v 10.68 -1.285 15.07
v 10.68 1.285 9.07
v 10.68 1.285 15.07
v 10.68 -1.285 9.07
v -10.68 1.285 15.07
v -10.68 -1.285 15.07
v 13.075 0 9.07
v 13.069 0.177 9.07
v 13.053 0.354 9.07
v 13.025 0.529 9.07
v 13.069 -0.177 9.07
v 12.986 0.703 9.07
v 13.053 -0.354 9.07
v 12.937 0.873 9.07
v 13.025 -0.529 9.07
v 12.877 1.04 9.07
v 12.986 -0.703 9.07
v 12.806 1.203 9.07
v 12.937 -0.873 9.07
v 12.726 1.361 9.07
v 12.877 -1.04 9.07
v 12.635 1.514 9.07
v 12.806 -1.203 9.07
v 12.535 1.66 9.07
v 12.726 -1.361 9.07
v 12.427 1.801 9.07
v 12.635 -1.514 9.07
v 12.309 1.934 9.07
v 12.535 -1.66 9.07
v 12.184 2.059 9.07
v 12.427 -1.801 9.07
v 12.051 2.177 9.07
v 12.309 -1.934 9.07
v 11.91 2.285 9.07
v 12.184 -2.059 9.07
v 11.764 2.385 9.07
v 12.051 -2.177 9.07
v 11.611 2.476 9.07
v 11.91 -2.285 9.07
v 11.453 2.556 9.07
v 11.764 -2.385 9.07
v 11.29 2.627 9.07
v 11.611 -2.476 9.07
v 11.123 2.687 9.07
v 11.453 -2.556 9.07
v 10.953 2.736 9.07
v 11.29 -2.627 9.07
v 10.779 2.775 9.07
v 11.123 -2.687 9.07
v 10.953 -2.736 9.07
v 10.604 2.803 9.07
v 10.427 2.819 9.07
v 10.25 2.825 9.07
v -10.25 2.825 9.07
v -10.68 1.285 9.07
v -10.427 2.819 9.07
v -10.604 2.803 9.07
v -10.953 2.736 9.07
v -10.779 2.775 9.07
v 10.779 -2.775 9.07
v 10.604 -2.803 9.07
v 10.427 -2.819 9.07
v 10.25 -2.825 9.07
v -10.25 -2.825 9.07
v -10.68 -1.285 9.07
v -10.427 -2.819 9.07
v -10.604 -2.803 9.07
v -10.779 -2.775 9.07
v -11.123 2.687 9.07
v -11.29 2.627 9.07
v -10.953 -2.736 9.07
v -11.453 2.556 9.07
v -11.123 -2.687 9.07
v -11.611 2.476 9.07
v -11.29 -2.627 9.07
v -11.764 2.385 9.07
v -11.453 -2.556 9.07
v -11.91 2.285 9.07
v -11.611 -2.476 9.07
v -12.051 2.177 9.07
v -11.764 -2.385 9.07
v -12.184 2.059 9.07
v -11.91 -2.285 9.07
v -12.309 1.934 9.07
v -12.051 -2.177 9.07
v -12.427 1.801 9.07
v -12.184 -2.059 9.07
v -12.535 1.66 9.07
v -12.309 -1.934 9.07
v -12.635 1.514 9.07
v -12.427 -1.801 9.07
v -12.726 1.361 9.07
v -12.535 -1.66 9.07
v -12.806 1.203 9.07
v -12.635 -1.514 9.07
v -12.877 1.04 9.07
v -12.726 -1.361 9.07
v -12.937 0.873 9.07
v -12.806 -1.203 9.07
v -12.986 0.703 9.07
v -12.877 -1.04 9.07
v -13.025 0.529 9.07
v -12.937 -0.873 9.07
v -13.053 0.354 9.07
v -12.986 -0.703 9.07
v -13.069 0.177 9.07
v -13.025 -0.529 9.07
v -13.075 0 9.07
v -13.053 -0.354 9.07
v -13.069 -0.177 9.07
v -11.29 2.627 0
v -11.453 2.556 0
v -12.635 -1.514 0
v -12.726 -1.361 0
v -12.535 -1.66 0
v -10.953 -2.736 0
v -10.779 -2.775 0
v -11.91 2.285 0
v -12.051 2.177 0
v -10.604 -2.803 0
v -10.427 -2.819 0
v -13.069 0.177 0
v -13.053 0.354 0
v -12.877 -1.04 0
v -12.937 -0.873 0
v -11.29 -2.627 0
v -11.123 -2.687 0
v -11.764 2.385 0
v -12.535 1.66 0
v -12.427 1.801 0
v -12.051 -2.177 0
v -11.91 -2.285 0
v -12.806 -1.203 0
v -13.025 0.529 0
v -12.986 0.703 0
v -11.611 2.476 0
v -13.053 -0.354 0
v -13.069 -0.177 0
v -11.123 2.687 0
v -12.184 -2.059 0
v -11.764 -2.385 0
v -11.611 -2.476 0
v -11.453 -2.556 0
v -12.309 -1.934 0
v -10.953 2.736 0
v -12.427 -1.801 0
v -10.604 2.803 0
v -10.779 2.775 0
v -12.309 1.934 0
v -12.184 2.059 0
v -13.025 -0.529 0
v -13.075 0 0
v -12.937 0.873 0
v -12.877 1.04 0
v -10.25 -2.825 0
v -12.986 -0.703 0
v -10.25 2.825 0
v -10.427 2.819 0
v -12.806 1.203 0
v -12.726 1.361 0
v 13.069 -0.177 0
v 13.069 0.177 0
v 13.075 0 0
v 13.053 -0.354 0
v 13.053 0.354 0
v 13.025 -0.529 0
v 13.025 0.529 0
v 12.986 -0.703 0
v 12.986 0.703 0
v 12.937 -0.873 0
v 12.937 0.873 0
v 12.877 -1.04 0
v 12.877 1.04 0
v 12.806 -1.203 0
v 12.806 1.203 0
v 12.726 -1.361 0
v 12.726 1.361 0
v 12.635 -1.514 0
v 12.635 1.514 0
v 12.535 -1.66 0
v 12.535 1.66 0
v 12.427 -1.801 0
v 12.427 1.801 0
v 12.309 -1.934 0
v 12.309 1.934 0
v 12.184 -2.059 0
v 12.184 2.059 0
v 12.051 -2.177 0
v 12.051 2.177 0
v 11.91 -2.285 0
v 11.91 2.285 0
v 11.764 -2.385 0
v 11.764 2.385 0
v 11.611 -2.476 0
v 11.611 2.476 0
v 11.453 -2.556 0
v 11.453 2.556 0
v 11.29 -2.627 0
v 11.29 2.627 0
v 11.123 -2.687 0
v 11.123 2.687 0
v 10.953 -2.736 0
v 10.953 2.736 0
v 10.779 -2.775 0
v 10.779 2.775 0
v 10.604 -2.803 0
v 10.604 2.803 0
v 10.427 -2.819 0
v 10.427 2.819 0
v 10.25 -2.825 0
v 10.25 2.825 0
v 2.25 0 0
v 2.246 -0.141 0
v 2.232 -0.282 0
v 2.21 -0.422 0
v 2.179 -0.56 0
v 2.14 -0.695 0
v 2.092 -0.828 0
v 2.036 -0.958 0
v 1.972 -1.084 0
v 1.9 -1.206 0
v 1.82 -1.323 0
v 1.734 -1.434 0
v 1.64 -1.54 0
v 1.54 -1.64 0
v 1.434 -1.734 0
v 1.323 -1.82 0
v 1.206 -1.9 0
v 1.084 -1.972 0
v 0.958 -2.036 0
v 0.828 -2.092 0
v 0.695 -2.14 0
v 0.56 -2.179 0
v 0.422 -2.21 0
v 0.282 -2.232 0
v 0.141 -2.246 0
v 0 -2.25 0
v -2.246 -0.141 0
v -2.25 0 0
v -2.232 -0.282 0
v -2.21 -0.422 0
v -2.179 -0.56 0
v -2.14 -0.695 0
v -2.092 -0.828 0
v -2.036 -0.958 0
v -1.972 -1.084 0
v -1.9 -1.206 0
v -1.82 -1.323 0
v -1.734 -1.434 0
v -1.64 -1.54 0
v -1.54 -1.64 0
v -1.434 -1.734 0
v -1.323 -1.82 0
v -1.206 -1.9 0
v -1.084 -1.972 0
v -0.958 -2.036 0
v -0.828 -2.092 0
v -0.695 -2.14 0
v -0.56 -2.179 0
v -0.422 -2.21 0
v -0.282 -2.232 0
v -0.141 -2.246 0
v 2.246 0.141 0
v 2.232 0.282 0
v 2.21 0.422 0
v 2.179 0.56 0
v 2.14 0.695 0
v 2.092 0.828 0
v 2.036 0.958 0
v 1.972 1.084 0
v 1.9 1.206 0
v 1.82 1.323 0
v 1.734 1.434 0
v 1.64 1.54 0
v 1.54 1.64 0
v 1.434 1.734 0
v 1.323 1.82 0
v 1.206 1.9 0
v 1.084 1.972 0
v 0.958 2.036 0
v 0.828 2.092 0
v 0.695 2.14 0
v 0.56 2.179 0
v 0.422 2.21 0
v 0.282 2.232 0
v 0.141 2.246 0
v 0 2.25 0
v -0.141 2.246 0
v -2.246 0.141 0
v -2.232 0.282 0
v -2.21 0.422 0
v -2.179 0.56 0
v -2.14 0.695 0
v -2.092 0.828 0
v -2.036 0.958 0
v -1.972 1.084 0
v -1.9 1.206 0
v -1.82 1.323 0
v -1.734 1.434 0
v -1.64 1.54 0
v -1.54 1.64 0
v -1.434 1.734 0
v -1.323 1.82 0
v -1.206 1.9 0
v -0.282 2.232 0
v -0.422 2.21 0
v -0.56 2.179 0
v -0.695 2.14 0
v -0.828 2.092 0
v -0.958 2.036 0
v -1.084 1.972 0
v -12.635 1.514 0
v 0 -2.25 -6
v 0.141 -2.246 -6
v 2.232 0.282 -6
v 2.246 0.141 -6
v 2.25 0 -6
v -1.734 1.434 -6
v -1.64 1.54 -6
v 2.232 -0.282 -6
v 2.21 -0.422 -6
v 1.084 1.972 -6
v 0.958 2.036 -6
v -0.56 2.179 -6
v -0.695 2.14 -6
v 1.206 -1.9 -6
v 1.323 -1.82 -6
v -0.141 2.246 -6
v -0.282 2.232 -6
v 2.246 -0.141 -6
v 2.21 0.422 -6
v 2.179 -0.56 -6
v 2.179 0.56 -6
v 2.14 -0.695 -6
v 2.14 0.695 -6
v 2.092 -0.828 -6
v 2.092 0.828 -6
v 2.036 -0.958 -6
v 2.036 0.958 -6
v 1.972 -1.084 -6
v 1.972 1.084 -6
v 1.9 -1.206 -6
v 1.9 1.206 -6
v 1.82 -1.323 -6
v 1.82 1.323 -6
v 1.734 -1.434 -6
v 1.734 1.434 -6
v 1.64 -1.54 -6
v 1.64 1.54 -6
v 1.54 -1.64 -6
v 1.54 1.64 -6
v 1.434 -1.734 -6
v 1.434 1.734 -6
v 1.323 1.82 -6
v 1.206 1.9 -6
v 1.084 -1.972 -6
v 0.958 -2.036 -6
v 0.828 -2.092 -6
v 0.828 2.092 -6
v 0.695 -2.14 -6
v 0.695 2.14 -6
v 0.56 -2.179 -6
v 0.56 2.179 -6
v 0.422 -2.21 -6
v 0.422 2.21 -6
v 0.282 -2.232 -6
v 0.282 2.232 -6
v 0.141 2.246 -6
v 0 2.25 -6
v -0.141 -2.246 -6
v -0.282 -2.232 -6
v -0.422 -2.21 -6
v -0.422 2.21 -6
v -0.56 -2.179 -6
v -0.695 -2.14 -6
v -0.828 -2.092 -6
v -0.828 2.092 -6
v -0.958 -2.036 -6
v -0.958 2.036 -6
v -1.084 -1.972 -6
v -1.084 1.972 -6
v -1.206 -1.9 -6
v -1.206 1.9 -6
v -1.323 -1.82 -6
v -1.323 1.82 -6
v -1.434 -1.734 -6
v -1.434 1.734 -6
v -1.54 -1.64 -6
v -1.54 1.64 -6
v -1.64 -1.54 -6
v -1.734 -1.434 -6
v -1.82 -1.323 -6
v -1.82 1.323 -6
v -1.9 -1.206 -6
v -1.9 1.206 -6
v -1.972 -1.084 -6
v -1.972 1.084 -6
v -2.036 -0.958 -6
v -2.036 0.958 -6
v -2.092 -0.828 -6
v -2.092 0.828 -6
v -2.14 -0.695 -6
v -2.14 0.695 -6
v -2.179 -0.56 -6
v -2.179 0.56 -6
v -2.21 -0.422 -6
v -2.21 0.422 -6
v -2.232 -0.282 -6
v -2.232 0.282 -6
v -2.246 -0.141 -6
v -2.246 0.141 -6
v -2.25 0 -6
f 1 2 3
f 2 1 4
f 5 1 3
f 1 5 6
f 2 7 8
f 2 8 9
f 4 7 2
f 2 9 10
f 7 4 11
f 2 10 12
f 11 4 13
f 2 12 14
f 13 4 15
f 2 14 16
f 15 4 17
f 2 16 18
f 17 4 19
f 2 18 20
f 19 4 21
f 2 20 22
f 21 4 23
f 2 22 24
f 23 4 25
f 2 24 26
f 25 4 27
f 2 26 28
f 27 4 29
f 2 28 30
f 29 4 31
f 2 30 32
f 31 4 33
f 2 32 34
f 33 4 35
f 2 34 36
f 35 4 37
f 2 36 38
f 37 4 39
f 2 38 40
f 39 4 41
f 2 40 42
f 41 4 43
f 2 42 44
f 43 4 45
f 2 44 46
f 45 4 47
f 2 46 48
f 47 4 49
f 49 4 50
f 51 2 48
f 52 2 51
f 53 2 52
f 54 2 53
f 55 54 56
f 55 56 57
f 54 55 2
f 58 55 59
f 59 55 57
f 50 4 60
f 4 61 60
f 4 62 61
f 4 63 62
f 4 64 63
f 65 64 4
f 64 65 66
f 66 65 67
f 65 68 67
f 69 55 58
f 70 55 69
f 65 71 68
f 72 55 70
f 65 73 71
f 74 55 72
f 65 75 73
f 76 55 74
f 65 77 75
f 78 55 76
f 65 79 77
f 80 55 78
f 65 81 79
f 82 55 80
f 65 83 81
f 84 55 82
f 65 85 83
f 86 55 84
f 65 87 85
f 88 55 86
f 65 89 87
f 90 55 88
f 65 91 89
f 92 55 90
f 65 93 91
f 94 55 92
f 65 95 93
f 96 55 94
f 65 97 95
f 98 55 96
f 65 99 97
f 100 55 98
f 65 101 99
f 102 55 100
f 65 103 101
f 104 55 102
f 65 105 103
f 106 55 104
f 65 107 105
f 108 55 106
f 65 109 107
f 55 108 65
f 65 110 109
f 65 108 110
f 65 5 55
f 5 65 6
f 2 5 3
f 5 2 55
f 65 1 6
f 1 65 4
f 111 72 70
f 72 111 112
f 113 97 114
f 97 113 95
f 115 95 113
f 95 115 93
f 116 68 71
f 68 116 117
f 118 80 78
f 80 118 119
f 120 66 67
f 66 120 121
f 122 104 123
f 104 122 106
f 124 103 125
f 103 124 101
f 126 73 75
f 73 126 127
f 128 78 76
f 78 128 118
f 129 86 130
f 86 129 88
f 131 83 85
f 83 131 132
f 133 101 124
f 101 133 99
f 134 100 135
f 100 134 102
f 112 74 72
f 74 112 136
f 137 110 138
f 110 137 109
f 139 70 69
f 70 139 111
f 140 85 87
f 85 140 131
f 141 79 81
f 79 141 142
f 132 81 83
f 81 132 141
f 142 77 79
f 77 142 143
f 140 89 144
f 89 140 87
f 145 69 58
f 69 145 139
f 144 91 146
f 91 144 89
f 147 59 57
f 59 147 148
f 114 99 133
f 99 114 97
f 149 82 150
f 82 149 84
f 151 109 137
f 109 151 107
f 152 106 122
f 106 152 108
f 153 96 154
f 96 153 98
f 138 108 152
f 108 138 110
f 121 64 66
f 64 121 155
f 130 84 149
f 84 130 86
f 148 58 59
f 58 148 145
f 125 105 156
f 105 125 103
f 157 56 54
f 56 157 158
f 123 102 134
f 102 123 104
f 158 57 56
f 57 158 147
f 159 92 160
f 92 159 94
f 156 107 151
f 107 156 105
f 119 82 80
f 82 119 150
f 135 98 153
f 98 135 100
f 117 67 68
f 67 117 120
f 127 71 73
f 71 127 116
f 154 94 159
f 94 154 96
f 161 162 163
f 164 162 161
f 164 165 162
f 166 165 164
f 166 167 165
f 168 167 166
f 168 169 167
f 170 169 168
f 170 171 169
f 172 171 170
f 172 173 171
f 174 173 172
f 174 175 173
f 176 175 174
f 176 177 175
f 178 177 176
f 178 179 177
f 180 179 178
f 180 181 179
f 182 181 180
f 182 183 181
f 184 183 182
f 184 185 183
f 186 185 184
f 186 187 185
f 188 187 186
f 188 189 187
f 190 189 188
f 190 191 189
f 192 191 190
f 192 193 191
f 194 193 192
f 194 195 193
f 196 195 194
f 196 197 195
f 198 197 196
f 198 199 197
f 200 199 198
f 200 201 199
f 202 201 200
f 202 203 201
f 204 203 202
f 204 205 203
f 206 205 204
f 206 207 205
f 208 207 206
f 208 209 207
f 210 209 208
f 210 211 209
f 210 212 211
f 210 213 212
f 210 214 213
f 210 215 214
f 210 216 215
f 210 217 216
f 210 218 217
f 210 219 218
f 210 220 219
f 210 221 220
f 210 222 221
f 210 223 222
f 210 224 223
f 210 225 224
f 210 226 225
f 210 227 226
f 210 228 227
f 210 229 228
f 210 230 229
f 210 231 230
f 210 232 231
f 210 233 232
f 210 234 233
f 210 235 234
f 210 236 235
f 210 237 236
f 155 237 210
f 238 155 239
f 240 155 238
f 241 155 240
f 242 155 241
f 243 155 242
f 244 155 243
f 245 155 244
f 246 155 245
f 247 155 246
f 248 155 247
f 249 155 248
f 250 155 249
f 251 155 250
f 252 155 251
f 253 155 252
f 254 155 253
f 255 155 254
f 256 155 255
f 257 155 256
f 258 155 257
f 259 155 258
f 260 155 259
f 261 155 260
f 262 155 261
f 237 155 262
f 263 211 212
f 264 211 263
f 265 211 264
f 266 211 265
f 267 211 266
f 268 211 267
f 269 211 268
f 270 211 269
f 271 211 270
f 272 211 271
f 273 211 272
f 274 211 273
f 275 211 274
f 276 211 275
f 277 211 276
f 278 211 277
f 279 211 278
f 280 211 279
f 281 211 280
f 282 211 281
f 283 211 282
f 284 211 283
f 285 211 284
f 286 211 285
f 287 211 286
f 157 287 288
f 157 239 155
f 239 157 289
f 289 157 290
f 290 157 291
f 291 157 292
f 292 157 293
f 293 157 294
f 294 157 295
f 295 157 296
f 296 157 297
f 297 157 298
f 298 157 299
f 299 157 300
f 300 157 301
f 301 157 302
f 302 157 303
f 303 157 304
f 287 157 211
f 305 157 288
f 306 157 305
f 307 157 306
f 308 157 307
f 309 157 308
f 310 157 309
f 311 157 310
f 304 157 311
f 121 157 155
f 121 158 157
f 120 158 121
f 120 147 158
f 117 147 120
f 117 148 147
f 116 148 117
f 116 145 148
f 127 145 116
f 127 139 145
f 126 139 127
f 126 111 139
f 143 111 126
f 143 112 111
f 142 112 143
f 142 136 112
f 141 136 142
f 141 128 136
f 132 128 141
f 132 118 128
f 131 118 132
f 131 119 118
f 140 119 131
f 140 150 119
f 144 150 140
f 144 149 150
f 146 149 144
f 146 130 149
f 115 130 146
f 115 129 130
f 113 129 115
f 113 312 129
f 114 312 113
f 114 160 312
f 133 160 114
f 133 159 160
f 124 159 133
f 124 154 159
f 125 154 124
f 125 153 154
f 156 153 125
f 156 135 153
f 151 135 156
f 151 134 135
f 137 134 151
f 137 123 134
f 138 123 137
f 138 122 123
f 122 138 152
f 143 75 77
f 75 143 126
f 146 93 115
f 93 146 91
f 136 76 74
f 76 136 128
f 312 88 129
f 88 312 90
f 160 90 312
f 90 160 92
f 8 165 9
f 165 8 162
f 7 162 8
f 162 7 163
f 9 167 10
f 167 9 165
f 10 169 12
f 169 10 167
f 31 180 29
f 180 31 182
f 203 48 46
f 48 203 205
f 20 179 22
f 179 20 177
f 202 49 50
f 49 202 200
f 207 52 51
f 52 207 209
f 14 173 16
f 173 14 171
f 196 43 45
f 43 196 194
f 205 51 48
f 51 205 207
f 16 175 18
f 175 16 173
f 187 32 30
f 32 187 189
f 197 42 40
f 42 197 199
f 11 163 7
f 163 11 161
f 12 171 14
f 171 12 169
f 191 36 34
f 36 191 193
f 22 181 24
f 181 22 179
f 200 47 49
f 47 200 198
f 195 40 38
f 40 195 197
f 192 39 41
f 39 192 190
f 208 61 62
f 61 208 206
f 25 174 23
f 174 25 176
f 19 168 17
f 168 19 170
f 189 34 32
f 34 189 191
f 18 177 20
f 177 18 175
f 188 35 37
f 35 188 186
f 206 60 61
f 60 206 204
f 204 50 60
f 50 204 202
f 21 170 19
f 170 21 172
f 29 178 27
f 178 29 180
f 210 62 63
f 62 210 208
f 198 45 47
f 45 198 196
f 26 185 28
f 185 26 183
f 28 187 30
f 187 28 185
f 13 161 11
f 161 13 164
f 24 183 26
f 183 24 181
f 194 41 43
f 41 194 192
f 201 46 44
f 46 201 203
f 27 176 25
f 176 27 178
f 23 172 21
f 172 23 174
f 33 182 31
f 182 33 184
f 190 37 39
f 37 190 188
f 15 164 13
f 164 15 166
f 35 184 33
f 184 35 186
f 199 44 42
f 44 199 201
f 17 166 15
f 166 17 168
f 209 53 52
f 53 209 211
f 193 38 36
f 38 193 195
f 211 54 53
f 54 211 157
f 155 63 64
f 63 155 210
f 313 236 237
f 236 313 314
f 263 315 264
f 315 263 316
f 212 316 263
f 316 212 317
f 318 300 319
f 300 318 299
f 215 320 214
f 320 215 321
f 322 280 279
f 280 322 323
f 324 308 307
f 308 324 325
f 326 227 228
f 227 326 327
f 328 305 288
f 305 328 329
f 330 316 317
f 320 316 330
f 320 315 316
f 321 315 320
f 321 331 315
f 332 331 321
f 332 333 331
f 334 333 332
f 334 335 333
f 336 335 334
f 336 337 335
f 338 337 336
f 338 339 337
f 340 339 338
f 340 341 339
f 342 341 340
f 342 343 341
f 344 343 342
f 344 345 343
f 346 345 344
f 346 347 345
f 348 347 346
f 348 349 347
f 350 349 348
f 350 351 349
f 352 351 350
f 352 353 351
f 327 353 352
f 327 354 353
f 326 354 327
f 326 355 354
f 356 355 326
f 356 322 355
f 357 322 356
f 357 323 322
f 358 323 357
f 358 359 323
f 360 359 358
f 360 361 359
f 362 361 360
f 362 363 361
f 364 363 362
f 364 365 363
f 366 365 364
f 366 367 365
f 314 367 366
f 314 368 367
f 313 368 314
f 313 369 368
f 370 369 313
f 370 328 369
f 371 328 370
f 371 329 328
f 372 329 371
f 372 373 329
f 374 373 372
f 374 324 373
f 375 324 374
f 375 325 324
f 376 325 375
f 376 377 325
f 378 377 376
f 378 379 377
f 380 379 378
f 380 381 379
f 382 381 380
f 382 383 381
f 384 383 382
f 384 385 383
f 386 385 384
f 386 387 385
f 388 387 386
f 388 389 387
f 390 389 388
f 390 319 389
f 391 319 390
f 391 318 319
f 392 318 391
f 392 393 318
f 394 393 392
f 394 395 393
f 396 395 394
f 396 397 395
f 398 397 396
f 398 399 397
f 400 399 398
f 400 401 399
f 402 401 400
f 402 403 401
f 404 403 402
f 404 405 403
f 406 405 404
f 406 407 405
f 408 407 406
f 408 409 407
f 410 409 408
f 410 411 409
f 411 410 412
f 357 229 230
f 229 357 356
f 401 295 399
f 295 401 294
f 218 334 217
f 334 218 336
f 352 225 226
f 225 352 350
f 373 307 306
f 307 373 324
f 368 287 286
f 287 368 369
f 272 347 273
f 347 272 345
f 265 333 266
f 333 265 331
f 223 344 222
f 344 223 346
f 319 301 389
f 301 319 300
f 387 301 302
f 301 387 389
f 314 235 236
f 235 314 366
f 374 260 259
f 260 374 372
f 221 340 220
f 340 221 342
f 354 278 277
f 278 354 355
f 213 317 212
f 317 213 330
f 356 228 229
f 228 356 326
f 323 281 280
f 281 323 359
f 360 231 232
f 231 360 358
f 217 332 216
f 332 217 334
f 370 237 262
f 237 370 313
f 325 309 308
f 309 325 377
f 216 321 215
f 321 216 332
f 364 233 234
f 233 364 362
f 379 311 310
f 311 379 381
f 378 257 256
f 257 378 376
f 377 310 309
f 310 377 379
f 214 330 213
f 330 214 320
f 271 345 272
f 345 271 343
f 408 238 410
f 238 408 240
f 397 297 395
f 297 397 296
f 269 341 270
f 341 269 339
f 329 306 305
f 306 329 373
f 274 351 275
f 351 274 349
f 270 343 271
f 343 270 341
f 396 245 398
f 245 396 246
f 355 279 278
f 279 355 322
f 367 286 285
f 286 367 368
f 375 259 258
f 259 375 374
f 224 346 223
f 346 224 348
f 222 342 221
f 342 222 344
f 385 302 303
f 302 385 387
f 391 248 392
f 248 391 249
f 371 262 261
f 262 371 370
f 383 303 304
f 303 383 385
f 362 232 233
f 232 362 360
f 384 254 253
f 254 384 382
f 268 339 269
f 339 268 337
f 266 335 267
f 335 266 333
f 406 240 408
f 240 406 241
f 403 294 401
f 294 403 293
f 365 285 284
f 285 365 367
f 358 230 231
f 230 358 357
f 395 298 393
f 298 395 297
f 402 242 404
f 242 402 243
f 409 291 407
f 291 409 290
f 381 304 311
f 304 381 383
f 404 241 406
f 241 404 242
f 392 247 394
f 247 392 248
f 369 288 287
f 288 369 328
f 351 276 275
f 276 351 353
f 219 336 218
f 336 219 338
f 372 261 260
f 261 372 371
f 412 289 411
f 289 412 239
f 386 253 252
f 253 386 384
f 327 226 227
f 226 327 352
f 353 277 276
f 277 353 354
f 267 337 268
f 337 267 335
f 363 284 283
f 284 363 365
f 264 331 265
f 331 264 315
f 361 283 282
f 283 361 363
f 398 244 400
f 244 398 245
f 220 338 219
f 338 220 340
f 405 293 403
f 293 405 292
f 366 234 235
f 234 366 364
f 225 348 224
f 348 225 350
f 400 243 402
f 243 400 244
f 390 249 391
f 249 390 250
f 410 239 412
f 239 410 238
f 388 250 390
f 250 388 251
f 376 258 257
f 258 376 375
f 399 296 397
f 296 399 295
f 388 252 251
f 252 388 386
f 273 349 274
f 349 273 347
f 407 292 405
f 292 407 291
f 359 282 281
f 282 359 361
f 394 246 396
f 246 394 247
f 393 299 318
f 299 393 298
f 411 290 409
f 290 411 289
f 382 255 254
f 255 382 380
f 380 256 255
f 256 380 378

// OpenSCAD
module iphone_connector()
{
  
//  $fn = 100;
  connector_depth = 2.57;
  connector_width = 21.36;
  connector_height = 6;

  plastic_width = 26.15;
  plastic_height = 9.07;
  plastic_depth = 5.65;
  
  cable_strain_diameter = 4.5;
  cable_strain_height = 6;
  
  plastic_block_width = plastic_width-plastic_depth;
  r_plastic_edge = plastic_depth/2;
  
  union()
  {
    translate([-connector_width/2, -connector_depth/2, plastic_height]) cube([connector_width, connector_depth, connector_height]); // connector protrusion
    translate([-plastic_block_width/2,0,0]) cylinder(r = r_plastic_edge, h = plastic_height); // left rounded edge
    translate([plastic_block_width/2,0,0]) cylinder(r = r_plastic_edge, h = plastic_height); // right rounded edge
    translate([-plastic_block_width/2,-plastic_depth/2,0]) cube([plastic_block_width, plastic_depth, plastic_height]); // center of plastic peice
    translate([0,0,-cable_strain_height]) cylinder(r = cable_strain_diameter/2, h = cable_strain_height); // cable strain protrusion
  }
  
}

$fn = 100;
iphone_connector();
